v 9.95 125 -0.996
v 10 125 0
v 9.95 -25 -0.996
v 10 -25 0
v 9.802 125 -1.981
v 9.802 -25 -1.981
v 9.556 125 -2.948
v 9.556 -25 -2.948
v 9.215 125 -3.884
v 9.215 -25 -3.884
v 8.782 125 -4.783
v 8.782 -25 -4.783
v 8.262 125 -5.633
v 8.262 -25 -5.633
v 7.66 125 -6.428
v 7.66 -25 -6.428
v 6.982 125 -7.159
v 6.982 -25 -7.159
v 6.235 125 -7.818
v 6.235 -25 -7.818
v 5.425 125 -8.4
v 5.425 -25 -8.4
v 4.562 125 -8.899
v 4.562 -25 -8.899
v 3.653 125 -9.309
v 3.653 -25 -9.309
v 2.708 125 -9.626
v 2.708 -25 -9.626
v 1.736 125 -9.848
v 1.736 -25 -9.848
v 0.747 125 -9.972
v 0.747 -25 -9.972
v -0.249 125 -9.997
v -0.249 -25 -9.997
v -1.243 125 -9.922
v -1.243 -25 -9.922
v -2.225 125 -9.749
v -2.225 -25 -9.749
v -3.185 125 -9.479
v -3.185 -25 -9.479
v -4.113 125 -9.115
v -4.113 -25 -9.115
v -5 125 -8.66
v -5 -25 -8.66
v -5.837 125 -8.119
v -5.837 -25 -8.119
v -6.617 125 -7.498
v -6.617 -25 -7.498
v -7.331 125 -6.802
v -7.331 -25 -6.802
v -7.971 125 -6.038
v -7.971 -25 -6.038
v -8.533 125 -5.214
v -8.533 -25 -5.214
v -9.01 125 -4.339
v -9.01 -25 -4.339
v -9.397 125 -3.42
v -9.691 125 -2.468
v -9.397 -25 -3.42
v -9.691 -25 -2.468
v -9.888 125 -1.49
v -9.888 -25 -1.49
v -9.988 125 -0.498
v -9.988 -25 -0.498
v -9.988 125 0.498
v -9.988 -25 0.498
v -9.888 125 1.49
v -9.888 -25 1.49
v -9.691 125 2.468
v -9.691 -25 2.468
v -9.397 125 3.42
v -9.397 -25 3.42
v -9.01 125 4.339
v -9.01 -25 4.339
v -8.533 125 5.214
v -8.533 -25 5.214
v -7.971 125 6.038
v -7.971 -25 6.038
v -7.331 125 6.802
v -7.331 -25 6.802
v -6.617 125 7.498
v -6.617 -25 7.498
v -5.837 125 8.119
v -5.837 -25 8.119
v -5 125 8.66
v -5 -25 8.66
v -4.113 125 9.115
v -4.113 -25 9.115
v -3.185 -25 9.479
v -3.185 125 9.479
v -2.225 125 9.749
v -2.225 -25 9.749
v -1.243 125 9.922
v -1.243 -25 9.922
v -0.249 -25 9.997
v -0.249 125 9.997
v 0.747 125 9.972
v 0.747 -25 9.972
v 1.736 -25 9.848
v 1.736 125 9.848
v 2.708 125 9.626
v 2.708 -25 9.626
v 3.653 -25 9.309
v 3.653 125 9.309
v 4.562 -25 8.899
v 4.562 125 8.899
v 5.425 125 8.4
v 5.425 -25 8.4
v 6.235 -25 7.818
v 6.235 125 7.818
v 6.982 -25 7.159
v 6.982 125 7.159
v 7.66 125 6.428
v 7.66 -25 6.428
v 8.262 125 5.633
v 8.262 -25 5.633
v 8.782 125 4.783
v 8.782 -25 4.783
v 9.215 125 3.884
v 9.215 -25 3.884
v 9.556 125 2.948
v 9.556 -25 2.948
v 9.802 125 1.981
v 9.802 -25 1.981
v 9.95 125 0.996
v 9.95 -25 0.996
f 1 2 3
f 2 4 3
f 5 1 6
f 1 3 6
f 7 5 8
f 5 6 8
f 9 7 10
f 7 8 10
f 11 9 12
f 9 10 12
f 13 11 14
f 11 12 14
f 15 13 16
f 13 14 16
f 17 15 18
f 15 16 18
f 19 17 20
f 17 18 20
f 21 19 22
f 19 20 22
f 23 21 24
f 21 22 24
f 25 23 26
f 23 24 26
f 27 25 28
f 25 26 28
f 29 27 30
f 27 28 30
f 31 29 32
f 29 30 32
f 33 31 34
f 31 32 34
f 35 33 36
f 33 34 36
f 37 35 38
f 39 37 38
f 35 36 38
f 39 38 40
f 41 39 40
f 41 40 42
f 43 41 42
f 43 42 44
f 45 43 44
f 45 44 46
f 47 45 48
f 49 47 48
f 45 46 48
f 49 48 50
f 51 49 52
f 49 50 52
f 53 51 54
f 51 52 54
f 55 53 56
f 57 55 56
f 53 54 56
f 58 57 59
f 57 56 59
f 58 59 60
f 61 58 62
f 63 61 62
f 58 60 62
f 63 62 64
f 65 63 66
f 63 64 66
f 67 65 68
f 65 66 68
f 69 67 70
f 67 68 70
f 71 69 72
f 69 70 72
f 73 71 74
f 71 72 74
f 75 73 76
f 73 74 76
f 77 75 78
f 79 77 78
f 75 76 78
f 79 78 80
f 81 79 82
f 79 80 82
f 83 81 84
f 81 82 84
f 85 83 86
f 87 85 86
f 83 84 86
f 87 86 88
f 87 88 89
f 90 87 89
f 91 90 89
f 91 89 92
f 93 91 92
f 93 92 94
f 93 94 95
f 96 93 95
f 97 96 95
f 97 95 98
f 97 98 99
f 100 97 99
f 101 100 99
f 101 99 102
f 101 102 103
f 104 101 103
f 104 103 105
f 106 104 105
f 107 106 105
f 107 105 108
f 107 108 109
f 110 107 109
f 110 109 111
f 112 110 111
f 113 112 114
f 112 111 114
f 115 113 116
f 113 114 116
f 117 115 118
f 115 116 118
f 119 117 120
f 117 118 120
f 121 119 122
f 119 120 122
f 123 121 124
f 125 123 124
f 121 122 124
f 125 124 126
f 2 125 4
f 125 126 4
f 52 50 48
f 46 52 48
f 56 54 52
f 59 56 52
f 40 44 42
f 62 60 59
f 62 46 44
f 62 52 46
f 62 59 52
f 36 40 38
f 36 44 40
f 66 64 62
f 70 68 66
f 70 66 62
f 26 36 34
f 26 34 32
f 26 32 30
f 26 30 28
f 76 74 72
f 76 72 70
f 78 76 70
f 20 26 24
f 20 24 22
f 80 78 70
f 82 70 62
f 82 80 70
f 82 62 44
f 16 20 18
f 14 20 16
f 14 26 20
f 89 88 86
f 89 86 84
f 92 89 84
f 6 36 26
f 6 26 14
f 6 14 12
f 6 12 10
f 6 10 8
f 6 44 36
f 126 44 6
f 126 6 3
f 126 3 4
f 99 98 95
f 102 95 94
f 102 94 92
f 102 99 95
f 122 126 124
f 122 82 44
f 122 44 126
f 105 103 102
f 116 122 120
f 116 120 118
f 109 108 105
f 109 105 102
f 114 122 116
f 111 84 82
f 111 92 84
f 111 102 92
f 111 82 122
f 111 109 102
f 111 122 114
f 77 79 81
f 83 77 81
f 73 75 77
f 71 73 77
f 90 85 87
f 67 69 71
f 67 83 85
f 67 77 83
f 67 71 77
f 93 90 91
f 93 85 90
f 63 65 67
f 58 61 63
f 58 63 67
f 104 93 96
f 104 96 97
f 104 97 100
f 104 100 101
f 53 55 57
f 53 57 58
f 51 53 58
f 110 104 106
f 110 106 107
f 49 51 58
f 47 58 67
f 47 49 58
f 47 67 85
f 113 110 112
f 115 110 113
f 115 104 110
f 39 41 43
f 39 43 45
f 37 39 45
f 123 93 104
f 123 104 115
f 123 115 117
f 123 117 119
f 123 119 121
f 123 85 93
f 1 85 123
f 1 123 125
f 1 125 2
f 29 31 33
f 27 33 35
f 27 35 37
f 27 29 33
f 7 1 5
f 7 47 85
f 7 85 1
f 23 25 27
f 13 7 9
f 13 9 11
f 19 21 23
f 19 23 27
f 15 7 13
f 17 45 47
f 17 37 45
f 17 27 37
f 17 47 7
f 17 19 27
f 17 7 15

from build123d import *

# Parameters (mm, degrees)
F0_R      = 10
F1_DEPTH  = 25
F1_FACE_R = 10
F2_DEPTH  = 25
F2_FACE_R = 10
F3_DEPTH  = 100


with BuildPart() as f1:
    # F0 (on Front) → F1 (new body)
    with BuildSketch(Plane.XZ):
        Circle(F0_R)
    extrude(amount=F1_DEPTH)

    # F1_face (on face) → F2 (join)
    with BuildSketch(Plane(origin=(0, 0, 0), x_dir=(1, 0, 0), z_dir=(0, 1, 0))):
        Circle(F1_FACE_R)
    extrude(amount=F2_DEPTH)

    # F2_face (on face) → F3 (join)
    with BuildSketch(Plane(origin=(0, 25, 0), x_dir=(1, 0, 0), z_dir=(0, 1, 0))):
        Circle(F2_FACE_R)
    extrude(amount=F3_DEPTH)


solid = f1.part
